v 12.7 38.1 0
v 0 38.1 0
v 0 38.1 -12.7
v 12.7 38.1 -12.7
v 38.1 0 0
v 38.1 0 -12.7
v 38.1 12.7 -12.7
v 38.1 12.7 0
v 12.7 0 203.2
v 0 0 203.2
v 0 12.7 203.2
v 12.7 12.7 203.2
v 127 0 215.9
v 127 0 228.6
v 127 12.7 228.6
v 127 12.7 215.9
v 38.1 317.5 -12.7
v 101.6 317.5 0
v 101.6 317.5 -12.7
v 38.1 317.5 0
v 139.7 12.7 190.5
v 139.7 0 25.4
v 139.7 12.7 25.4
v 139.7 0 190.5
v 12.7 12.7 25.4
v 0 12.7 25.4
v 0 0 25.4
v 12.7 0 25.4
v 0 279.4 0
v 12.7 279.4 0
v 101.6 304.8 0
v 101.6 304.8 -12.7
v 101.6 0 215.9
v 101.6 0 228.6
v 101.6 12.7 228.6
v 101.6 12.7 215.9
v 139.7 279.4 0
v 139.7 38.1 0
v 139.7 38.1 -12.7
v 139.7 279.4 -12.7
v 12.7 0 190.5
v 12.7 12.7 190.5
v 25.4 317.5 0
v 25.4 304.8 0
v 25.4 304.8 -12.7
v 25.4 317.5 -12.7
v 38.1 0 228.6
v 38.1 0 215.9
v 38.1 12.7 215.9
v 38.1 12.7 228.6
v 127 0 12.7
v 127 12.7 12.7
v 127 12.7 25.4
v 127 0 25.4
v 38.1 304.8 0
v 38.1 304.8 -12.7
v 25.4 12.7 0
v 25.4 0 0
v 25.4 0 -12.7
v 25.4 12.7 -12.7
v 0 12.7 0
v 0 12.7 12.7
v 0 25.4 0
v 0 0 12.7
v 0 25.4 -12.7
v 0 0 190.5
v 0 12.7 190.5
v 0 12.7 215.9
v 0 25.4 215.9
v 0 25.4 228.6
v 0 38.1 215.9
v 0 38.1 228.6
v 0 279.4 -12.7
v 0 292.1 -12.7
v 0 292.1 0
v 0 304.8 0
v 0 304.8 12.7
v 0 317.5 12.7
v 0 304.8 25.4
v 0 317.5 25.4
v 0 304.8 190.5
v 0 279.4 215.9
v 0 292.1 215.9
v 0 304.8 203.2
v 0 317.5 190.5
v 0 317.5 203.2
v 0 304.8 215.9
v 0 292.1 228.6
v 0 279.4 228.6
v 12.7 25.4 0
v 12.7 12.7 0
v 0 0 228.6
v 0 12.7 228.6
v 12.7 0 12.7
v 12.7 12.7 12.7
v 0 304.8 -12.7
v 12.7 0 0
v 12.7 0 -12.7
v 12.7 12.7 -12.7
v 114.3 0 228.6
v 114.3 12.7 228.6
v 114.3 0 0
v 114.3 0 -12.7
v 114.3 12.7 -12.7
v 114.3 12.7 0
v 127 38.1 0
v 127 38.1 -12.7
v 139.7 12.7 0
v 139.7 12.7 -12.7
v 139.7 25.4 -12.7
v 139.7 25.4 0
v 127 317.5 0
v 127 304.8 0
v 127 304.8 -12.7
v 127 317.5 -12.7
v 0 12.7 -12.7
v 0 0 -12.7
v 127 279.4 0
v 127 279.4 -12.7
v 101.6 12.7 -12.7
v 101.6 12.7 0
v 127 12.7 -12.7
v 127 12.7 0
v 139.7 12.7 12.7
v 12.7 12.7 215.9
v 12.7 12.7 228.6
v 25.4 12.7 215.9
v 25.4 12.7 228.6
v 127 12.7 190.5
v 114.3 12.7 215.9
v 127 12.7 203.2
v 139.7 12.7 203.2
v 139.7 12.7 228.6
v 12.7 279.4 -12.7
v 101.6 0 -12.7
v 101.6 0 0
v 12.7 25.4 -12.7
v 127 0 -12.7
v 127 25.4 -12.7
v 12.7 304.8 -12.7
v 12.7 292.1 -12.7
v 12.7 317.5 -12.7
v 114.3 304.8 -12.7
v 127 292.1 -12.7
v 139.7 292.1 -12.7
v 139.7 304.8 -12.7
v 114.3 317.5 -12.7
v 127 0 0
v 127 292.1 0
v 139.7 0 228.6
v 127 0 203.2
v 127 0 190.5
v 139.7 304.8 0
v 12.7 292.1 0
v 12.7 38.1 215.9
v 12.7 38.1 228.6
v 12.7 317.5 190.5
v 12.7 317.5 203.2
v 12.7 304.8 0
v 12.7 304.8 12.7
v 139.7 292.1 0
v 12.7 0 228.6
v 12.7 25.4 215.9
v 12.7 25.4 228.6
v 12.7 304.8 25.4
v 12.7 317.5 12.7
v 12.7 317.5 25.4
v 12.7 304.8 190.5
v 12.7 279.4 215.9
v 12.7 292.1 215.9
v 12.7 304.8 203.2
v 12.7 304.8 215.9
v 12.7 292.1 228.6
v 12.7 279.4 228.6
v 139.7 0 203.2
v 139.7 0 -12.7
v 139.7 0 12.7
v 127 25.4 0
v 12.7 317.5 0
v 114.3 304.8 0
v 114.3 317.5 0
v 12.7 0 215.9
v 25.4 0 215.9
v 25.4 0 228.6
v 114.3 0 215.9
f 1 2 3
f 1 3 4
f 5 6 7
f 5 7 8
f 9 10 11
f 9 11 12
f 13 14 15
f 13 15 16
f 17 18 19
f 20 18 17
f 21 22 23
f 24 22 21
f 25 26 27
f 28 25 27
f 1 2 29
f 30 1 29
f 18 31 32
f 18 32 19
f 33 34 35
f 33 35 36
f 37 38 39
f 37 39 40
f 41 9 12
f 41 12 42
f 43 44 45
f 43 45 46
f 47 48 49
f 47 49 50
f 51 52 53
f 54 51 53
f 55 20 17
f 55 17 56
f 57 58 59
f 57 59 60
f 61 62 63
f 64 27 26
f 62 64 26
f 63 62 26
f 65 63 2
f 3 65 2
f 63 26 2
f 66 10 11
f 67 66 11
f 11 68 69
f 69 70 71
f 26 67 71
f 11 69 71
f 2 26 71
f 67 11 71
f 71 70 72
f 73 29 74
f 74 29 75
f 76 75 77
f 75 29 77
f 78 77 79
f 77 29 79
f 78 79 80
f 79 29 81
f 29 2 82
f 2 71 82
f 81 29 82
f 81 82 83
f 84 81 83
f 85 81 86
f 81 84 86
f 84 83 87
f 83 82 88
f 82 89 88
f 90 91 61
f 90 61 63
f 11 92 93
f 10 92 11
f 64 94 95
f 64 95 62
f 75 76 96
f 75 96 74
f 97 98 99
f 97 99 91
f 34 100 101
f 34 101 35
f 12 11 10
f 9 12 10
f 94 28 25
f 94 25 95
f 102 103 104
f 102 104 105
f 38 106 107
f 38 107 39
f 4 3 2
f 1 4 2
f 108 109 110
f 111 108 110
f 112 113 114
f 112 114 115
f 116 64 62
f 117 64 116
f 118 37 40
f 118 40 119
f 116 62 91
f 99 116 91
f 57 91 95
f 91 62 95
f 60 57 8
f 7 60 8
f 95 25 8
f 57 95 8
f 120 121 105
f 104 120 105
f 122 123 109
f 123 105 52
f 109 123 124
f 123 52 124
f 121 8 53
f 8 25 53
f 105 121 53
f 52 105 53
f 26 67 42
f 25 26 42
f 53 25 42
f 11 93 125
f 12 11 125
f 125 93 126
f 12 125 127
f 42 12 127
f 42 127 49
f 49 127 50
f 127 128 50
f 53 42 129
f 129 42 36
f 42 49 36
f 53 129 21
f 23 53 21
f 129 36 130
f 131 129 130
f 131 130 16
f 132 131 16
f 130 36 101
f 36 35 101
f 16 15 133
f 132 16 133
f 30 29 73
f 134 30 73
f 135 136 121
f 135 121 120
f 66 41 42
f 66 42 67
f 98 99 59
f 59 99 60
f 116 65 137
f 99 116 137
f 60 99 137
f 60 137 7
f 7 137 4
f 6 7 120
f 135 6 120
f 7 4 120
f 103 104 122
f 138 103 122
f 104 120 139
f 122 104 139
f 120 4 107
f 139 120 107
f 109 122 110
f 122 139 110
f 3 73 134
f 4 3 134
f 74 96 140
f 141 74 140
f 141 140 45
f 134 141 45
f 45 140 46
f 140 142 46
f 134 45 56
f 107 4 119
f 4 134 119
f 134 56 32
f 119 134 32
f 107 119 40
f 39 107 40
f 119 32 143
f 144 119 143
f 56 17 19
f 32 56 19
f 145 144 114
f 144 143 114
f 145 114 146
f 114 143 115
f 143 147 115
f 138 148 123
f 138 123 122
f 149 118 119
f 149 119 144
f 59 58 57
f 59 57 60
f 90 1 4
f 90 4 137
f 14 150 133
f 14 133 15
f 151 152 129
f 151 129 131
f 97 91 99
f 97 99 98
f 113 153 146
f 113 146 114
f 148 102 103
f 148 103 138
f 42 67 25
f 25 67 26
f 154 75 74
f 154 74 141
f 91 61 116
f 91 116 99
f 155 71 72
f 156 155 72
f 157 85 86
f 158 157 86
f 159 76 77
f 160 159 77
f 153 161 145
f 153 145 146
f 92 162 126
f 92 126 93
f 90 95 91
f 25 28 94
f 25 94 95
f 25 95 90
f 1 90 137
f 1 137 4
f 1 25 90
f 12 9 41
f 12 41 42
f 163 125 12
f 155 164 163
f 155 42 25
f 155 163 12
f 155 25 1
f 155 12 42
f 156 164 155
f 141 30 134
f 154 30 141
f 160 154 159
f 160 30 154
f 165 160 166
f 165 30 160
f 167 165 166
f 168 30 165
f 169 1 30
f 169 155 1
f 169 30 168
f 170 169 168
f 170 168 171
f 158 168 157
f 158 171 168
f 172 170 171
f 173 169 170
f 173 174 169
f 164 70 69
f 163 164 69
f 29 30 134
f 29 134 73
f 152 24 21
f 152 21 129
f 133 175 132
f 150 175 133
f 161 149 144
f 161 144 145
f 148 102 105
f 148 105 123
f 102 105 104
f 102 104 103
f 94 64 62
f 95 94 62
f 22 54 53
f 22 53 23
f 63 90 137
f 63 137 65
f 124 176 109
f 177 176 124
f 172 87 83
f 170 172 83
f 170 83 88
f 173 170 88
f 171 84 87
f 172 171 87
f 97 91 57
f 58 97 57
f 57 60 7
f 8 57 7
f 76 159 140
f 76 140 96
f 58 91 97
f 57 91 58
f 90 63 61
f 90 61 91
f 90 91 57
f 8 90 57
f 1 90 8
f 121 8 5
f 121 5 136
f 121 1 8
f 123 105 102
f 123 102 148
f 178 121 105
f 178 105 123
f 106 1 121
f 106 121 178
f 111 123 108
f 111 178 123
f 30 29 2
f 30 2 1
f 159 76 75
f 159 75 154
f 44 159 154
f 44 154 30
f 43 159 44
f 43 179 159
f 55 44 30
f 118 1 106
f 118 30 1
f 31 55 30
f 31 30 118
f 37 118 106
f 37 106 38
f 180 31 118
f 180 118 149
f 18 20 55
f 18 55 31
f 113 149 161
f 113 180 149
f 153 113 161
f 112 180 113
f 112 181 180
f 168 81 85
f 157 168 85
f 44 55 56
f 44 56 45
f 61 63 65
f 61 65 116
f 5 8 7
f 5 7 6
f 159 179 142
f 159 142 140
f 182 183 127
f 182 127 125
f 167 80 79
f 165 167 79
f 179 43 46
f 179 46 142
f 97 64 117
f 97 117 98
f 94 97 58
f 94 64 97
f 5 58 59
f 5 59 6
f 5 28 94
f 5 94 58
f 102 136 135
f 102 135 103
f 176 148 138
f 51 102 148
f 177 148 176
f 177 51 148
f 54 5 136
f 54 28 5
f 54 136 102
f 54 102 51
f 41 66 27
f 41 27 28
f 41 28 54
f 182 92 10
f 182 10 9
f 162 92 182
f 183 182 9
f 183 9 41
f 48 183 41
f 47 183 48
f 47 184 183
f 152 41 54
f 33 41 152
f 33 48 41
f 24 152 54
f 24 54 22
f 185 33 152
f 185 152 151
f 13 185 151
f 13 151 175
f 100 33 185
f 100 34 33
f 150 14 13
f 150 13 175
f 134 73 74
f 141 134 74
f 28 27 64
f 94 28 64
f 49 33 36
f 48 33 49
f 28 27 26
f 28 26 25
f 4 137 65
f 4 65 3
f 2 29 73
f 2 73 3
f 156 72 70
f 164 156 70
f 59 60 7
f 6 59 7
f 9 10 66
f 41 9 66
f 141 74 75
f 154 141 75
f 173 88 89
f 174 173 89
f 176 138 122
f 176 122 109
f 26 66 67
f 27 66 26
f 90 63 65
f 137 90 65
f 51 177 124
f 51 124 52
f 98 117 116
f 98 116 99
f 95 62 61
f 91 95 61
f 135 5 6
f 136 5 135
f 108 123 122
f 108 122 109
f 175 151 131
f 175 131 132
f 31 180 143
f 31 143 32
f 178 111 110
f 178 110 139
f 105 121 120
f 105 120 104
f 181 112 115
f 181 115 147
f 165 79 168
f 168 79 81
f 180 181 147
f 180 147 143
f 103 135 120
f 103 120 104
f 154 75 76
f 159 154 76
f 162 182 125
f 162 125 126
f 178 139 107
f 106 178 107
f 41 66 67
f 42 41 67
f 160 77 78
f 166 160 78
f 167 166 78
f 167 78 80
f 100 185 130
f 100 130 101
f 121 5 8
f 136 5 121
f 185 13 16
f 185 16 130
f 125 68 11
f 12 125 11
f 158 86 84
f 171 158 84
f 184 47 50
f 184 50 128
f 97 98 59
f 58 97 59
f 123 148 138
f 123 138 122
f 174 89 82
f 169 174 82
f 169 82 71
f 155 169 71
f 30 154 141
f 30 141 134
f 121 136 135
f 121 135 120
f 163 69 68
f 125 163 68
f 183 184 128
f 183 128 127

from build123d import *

# Parameters (mm, degrees)
F1_DEPTH = 12.7
F3_DEPTH = 12.7
F5_DEPTH = 12.7


with BuildPart() as f1:
    # F0 (on Top) → F1 (new body)
    with BuildSketch(Plane.XY):
        Polygon((12.7, 12.7), (12.7, 0), (25.4, 0), (25.4, 12.7), (38.1, 12.7), (38.1, 0), (69.85, 0), (101.6, 0), (101.6, 12.7), (114.3, 12.7), (114.3, 0), (127, 0), (127, 12.7), (139.7, 12.7), (139.7, 25.4), (127, 25.4), (127, 38.1), (139.7, 38.1), (139.7, 279.4), (127, 279.4), (127, 292.1), (139.7, 292.1), (139.7, 304.8), (127, 304.8), (127, 317.5), (114.3, 317.5), (114.3, 304.8), (101.6, 304.8), (101.6, 317.5), (38.1, 317.5), (38.1, 304.8), (25.4, 304.8), (25.4, 317.5), (12.7, 317.5), (12.7, 304.8), (0, 304.8), (0, 292.1), (12.7, 292.1), (12.7, 279.4), (0, 279.4), (0, 158.75), (0, 38.1), (12.7, 38.1), (12.7, 25.4), (0, 25.4), (0, 12.7), align=None)
    extrude(amount=-F1_DEPTH)


with BuildPart() as f3:
    # F2 (on Front) → F3 (new body)
    with BuildSketch(Plane.XZ):
        Polygon((0, 12.7), (0, 0), (0, -12.7), (12.7, -12.7), (12.7, 0), (25.4, 0), (25.4, -12.7), (38.1, -12.7), (38.1, 0), (69.85, 0), (101.6, 0), (101.6, -12.7), (114.3, -12.7), (114.3, 0), (127, 0), (127, -12.7), (139.7, -12.7), (139.7, 0), (139.7, 12.7), (127, 12.7), (127, 25.4), (139.7, 25.4), (139.7, 190.5), (127, 190.5), (127, 203.2), (139.7, 203.2), (139.7, 215.9), (139.7, 228.6), (127, 228.6), (127, 215.9), (114.3, 215.9), (114.3, 228.6), (101.6, 228.6), (101.6, 215.9), (38.1, 215.9), (38.1, 228.6), (25.4, 228.6), (25.4, 215.9), (12.7, 215.9), (12.7, 228.6), (0, 228.6), (0, 215.9), (0, 203.2), (12.7, 203.2), (12.7, 190.5), (0, 190.5), (0, 107.95), (0, 25.4), (12.7, 25.4), (12.7, 12.7), align=None)
    extrude(amount=-F3_DEPTH)


with BuildPart() as f5:
    # F4 (on Right) → F5 (new body)
    with BuildSketch(Plane.YZ):
        Polygon((12.7, 12.7), (12.7, 0), (25.4, 0), (25.4, -12.7), (38.1, -12.7), (38.1, 0), (279.4, 0), (279.4, -12.7), (292.1, -12.7), (292.1, 0), (304.8, 0), (304.8, 12.7), (317.5, 12.7), (317.5, 25.4), (304.8, 25.4), (304.8, 190.5), (317.5, 190.5), (317.5, 203.2), (304.8, 203.2), (304.8, 215.9), (292.1, 215.9), (292.1, 228.6), (279.4, 228.6), (279.4, 215.9), (158.75, 215.9), (38.1, 215.9), (38.1, 228.6), (25.4, 228.6), (25.4, 215.9), (12.7, 215.9), (12.7, 203.2), (0, 203.2), (0, 190.5), (12.7, 190.5), (12.7, 107.95), (12.7, 25.4), (0, 25.4), (0, 12.7), align=None)
    extrude(amount=F5_DEPTH)


solid = Compound([f1.part, f3.part, f5.part])
